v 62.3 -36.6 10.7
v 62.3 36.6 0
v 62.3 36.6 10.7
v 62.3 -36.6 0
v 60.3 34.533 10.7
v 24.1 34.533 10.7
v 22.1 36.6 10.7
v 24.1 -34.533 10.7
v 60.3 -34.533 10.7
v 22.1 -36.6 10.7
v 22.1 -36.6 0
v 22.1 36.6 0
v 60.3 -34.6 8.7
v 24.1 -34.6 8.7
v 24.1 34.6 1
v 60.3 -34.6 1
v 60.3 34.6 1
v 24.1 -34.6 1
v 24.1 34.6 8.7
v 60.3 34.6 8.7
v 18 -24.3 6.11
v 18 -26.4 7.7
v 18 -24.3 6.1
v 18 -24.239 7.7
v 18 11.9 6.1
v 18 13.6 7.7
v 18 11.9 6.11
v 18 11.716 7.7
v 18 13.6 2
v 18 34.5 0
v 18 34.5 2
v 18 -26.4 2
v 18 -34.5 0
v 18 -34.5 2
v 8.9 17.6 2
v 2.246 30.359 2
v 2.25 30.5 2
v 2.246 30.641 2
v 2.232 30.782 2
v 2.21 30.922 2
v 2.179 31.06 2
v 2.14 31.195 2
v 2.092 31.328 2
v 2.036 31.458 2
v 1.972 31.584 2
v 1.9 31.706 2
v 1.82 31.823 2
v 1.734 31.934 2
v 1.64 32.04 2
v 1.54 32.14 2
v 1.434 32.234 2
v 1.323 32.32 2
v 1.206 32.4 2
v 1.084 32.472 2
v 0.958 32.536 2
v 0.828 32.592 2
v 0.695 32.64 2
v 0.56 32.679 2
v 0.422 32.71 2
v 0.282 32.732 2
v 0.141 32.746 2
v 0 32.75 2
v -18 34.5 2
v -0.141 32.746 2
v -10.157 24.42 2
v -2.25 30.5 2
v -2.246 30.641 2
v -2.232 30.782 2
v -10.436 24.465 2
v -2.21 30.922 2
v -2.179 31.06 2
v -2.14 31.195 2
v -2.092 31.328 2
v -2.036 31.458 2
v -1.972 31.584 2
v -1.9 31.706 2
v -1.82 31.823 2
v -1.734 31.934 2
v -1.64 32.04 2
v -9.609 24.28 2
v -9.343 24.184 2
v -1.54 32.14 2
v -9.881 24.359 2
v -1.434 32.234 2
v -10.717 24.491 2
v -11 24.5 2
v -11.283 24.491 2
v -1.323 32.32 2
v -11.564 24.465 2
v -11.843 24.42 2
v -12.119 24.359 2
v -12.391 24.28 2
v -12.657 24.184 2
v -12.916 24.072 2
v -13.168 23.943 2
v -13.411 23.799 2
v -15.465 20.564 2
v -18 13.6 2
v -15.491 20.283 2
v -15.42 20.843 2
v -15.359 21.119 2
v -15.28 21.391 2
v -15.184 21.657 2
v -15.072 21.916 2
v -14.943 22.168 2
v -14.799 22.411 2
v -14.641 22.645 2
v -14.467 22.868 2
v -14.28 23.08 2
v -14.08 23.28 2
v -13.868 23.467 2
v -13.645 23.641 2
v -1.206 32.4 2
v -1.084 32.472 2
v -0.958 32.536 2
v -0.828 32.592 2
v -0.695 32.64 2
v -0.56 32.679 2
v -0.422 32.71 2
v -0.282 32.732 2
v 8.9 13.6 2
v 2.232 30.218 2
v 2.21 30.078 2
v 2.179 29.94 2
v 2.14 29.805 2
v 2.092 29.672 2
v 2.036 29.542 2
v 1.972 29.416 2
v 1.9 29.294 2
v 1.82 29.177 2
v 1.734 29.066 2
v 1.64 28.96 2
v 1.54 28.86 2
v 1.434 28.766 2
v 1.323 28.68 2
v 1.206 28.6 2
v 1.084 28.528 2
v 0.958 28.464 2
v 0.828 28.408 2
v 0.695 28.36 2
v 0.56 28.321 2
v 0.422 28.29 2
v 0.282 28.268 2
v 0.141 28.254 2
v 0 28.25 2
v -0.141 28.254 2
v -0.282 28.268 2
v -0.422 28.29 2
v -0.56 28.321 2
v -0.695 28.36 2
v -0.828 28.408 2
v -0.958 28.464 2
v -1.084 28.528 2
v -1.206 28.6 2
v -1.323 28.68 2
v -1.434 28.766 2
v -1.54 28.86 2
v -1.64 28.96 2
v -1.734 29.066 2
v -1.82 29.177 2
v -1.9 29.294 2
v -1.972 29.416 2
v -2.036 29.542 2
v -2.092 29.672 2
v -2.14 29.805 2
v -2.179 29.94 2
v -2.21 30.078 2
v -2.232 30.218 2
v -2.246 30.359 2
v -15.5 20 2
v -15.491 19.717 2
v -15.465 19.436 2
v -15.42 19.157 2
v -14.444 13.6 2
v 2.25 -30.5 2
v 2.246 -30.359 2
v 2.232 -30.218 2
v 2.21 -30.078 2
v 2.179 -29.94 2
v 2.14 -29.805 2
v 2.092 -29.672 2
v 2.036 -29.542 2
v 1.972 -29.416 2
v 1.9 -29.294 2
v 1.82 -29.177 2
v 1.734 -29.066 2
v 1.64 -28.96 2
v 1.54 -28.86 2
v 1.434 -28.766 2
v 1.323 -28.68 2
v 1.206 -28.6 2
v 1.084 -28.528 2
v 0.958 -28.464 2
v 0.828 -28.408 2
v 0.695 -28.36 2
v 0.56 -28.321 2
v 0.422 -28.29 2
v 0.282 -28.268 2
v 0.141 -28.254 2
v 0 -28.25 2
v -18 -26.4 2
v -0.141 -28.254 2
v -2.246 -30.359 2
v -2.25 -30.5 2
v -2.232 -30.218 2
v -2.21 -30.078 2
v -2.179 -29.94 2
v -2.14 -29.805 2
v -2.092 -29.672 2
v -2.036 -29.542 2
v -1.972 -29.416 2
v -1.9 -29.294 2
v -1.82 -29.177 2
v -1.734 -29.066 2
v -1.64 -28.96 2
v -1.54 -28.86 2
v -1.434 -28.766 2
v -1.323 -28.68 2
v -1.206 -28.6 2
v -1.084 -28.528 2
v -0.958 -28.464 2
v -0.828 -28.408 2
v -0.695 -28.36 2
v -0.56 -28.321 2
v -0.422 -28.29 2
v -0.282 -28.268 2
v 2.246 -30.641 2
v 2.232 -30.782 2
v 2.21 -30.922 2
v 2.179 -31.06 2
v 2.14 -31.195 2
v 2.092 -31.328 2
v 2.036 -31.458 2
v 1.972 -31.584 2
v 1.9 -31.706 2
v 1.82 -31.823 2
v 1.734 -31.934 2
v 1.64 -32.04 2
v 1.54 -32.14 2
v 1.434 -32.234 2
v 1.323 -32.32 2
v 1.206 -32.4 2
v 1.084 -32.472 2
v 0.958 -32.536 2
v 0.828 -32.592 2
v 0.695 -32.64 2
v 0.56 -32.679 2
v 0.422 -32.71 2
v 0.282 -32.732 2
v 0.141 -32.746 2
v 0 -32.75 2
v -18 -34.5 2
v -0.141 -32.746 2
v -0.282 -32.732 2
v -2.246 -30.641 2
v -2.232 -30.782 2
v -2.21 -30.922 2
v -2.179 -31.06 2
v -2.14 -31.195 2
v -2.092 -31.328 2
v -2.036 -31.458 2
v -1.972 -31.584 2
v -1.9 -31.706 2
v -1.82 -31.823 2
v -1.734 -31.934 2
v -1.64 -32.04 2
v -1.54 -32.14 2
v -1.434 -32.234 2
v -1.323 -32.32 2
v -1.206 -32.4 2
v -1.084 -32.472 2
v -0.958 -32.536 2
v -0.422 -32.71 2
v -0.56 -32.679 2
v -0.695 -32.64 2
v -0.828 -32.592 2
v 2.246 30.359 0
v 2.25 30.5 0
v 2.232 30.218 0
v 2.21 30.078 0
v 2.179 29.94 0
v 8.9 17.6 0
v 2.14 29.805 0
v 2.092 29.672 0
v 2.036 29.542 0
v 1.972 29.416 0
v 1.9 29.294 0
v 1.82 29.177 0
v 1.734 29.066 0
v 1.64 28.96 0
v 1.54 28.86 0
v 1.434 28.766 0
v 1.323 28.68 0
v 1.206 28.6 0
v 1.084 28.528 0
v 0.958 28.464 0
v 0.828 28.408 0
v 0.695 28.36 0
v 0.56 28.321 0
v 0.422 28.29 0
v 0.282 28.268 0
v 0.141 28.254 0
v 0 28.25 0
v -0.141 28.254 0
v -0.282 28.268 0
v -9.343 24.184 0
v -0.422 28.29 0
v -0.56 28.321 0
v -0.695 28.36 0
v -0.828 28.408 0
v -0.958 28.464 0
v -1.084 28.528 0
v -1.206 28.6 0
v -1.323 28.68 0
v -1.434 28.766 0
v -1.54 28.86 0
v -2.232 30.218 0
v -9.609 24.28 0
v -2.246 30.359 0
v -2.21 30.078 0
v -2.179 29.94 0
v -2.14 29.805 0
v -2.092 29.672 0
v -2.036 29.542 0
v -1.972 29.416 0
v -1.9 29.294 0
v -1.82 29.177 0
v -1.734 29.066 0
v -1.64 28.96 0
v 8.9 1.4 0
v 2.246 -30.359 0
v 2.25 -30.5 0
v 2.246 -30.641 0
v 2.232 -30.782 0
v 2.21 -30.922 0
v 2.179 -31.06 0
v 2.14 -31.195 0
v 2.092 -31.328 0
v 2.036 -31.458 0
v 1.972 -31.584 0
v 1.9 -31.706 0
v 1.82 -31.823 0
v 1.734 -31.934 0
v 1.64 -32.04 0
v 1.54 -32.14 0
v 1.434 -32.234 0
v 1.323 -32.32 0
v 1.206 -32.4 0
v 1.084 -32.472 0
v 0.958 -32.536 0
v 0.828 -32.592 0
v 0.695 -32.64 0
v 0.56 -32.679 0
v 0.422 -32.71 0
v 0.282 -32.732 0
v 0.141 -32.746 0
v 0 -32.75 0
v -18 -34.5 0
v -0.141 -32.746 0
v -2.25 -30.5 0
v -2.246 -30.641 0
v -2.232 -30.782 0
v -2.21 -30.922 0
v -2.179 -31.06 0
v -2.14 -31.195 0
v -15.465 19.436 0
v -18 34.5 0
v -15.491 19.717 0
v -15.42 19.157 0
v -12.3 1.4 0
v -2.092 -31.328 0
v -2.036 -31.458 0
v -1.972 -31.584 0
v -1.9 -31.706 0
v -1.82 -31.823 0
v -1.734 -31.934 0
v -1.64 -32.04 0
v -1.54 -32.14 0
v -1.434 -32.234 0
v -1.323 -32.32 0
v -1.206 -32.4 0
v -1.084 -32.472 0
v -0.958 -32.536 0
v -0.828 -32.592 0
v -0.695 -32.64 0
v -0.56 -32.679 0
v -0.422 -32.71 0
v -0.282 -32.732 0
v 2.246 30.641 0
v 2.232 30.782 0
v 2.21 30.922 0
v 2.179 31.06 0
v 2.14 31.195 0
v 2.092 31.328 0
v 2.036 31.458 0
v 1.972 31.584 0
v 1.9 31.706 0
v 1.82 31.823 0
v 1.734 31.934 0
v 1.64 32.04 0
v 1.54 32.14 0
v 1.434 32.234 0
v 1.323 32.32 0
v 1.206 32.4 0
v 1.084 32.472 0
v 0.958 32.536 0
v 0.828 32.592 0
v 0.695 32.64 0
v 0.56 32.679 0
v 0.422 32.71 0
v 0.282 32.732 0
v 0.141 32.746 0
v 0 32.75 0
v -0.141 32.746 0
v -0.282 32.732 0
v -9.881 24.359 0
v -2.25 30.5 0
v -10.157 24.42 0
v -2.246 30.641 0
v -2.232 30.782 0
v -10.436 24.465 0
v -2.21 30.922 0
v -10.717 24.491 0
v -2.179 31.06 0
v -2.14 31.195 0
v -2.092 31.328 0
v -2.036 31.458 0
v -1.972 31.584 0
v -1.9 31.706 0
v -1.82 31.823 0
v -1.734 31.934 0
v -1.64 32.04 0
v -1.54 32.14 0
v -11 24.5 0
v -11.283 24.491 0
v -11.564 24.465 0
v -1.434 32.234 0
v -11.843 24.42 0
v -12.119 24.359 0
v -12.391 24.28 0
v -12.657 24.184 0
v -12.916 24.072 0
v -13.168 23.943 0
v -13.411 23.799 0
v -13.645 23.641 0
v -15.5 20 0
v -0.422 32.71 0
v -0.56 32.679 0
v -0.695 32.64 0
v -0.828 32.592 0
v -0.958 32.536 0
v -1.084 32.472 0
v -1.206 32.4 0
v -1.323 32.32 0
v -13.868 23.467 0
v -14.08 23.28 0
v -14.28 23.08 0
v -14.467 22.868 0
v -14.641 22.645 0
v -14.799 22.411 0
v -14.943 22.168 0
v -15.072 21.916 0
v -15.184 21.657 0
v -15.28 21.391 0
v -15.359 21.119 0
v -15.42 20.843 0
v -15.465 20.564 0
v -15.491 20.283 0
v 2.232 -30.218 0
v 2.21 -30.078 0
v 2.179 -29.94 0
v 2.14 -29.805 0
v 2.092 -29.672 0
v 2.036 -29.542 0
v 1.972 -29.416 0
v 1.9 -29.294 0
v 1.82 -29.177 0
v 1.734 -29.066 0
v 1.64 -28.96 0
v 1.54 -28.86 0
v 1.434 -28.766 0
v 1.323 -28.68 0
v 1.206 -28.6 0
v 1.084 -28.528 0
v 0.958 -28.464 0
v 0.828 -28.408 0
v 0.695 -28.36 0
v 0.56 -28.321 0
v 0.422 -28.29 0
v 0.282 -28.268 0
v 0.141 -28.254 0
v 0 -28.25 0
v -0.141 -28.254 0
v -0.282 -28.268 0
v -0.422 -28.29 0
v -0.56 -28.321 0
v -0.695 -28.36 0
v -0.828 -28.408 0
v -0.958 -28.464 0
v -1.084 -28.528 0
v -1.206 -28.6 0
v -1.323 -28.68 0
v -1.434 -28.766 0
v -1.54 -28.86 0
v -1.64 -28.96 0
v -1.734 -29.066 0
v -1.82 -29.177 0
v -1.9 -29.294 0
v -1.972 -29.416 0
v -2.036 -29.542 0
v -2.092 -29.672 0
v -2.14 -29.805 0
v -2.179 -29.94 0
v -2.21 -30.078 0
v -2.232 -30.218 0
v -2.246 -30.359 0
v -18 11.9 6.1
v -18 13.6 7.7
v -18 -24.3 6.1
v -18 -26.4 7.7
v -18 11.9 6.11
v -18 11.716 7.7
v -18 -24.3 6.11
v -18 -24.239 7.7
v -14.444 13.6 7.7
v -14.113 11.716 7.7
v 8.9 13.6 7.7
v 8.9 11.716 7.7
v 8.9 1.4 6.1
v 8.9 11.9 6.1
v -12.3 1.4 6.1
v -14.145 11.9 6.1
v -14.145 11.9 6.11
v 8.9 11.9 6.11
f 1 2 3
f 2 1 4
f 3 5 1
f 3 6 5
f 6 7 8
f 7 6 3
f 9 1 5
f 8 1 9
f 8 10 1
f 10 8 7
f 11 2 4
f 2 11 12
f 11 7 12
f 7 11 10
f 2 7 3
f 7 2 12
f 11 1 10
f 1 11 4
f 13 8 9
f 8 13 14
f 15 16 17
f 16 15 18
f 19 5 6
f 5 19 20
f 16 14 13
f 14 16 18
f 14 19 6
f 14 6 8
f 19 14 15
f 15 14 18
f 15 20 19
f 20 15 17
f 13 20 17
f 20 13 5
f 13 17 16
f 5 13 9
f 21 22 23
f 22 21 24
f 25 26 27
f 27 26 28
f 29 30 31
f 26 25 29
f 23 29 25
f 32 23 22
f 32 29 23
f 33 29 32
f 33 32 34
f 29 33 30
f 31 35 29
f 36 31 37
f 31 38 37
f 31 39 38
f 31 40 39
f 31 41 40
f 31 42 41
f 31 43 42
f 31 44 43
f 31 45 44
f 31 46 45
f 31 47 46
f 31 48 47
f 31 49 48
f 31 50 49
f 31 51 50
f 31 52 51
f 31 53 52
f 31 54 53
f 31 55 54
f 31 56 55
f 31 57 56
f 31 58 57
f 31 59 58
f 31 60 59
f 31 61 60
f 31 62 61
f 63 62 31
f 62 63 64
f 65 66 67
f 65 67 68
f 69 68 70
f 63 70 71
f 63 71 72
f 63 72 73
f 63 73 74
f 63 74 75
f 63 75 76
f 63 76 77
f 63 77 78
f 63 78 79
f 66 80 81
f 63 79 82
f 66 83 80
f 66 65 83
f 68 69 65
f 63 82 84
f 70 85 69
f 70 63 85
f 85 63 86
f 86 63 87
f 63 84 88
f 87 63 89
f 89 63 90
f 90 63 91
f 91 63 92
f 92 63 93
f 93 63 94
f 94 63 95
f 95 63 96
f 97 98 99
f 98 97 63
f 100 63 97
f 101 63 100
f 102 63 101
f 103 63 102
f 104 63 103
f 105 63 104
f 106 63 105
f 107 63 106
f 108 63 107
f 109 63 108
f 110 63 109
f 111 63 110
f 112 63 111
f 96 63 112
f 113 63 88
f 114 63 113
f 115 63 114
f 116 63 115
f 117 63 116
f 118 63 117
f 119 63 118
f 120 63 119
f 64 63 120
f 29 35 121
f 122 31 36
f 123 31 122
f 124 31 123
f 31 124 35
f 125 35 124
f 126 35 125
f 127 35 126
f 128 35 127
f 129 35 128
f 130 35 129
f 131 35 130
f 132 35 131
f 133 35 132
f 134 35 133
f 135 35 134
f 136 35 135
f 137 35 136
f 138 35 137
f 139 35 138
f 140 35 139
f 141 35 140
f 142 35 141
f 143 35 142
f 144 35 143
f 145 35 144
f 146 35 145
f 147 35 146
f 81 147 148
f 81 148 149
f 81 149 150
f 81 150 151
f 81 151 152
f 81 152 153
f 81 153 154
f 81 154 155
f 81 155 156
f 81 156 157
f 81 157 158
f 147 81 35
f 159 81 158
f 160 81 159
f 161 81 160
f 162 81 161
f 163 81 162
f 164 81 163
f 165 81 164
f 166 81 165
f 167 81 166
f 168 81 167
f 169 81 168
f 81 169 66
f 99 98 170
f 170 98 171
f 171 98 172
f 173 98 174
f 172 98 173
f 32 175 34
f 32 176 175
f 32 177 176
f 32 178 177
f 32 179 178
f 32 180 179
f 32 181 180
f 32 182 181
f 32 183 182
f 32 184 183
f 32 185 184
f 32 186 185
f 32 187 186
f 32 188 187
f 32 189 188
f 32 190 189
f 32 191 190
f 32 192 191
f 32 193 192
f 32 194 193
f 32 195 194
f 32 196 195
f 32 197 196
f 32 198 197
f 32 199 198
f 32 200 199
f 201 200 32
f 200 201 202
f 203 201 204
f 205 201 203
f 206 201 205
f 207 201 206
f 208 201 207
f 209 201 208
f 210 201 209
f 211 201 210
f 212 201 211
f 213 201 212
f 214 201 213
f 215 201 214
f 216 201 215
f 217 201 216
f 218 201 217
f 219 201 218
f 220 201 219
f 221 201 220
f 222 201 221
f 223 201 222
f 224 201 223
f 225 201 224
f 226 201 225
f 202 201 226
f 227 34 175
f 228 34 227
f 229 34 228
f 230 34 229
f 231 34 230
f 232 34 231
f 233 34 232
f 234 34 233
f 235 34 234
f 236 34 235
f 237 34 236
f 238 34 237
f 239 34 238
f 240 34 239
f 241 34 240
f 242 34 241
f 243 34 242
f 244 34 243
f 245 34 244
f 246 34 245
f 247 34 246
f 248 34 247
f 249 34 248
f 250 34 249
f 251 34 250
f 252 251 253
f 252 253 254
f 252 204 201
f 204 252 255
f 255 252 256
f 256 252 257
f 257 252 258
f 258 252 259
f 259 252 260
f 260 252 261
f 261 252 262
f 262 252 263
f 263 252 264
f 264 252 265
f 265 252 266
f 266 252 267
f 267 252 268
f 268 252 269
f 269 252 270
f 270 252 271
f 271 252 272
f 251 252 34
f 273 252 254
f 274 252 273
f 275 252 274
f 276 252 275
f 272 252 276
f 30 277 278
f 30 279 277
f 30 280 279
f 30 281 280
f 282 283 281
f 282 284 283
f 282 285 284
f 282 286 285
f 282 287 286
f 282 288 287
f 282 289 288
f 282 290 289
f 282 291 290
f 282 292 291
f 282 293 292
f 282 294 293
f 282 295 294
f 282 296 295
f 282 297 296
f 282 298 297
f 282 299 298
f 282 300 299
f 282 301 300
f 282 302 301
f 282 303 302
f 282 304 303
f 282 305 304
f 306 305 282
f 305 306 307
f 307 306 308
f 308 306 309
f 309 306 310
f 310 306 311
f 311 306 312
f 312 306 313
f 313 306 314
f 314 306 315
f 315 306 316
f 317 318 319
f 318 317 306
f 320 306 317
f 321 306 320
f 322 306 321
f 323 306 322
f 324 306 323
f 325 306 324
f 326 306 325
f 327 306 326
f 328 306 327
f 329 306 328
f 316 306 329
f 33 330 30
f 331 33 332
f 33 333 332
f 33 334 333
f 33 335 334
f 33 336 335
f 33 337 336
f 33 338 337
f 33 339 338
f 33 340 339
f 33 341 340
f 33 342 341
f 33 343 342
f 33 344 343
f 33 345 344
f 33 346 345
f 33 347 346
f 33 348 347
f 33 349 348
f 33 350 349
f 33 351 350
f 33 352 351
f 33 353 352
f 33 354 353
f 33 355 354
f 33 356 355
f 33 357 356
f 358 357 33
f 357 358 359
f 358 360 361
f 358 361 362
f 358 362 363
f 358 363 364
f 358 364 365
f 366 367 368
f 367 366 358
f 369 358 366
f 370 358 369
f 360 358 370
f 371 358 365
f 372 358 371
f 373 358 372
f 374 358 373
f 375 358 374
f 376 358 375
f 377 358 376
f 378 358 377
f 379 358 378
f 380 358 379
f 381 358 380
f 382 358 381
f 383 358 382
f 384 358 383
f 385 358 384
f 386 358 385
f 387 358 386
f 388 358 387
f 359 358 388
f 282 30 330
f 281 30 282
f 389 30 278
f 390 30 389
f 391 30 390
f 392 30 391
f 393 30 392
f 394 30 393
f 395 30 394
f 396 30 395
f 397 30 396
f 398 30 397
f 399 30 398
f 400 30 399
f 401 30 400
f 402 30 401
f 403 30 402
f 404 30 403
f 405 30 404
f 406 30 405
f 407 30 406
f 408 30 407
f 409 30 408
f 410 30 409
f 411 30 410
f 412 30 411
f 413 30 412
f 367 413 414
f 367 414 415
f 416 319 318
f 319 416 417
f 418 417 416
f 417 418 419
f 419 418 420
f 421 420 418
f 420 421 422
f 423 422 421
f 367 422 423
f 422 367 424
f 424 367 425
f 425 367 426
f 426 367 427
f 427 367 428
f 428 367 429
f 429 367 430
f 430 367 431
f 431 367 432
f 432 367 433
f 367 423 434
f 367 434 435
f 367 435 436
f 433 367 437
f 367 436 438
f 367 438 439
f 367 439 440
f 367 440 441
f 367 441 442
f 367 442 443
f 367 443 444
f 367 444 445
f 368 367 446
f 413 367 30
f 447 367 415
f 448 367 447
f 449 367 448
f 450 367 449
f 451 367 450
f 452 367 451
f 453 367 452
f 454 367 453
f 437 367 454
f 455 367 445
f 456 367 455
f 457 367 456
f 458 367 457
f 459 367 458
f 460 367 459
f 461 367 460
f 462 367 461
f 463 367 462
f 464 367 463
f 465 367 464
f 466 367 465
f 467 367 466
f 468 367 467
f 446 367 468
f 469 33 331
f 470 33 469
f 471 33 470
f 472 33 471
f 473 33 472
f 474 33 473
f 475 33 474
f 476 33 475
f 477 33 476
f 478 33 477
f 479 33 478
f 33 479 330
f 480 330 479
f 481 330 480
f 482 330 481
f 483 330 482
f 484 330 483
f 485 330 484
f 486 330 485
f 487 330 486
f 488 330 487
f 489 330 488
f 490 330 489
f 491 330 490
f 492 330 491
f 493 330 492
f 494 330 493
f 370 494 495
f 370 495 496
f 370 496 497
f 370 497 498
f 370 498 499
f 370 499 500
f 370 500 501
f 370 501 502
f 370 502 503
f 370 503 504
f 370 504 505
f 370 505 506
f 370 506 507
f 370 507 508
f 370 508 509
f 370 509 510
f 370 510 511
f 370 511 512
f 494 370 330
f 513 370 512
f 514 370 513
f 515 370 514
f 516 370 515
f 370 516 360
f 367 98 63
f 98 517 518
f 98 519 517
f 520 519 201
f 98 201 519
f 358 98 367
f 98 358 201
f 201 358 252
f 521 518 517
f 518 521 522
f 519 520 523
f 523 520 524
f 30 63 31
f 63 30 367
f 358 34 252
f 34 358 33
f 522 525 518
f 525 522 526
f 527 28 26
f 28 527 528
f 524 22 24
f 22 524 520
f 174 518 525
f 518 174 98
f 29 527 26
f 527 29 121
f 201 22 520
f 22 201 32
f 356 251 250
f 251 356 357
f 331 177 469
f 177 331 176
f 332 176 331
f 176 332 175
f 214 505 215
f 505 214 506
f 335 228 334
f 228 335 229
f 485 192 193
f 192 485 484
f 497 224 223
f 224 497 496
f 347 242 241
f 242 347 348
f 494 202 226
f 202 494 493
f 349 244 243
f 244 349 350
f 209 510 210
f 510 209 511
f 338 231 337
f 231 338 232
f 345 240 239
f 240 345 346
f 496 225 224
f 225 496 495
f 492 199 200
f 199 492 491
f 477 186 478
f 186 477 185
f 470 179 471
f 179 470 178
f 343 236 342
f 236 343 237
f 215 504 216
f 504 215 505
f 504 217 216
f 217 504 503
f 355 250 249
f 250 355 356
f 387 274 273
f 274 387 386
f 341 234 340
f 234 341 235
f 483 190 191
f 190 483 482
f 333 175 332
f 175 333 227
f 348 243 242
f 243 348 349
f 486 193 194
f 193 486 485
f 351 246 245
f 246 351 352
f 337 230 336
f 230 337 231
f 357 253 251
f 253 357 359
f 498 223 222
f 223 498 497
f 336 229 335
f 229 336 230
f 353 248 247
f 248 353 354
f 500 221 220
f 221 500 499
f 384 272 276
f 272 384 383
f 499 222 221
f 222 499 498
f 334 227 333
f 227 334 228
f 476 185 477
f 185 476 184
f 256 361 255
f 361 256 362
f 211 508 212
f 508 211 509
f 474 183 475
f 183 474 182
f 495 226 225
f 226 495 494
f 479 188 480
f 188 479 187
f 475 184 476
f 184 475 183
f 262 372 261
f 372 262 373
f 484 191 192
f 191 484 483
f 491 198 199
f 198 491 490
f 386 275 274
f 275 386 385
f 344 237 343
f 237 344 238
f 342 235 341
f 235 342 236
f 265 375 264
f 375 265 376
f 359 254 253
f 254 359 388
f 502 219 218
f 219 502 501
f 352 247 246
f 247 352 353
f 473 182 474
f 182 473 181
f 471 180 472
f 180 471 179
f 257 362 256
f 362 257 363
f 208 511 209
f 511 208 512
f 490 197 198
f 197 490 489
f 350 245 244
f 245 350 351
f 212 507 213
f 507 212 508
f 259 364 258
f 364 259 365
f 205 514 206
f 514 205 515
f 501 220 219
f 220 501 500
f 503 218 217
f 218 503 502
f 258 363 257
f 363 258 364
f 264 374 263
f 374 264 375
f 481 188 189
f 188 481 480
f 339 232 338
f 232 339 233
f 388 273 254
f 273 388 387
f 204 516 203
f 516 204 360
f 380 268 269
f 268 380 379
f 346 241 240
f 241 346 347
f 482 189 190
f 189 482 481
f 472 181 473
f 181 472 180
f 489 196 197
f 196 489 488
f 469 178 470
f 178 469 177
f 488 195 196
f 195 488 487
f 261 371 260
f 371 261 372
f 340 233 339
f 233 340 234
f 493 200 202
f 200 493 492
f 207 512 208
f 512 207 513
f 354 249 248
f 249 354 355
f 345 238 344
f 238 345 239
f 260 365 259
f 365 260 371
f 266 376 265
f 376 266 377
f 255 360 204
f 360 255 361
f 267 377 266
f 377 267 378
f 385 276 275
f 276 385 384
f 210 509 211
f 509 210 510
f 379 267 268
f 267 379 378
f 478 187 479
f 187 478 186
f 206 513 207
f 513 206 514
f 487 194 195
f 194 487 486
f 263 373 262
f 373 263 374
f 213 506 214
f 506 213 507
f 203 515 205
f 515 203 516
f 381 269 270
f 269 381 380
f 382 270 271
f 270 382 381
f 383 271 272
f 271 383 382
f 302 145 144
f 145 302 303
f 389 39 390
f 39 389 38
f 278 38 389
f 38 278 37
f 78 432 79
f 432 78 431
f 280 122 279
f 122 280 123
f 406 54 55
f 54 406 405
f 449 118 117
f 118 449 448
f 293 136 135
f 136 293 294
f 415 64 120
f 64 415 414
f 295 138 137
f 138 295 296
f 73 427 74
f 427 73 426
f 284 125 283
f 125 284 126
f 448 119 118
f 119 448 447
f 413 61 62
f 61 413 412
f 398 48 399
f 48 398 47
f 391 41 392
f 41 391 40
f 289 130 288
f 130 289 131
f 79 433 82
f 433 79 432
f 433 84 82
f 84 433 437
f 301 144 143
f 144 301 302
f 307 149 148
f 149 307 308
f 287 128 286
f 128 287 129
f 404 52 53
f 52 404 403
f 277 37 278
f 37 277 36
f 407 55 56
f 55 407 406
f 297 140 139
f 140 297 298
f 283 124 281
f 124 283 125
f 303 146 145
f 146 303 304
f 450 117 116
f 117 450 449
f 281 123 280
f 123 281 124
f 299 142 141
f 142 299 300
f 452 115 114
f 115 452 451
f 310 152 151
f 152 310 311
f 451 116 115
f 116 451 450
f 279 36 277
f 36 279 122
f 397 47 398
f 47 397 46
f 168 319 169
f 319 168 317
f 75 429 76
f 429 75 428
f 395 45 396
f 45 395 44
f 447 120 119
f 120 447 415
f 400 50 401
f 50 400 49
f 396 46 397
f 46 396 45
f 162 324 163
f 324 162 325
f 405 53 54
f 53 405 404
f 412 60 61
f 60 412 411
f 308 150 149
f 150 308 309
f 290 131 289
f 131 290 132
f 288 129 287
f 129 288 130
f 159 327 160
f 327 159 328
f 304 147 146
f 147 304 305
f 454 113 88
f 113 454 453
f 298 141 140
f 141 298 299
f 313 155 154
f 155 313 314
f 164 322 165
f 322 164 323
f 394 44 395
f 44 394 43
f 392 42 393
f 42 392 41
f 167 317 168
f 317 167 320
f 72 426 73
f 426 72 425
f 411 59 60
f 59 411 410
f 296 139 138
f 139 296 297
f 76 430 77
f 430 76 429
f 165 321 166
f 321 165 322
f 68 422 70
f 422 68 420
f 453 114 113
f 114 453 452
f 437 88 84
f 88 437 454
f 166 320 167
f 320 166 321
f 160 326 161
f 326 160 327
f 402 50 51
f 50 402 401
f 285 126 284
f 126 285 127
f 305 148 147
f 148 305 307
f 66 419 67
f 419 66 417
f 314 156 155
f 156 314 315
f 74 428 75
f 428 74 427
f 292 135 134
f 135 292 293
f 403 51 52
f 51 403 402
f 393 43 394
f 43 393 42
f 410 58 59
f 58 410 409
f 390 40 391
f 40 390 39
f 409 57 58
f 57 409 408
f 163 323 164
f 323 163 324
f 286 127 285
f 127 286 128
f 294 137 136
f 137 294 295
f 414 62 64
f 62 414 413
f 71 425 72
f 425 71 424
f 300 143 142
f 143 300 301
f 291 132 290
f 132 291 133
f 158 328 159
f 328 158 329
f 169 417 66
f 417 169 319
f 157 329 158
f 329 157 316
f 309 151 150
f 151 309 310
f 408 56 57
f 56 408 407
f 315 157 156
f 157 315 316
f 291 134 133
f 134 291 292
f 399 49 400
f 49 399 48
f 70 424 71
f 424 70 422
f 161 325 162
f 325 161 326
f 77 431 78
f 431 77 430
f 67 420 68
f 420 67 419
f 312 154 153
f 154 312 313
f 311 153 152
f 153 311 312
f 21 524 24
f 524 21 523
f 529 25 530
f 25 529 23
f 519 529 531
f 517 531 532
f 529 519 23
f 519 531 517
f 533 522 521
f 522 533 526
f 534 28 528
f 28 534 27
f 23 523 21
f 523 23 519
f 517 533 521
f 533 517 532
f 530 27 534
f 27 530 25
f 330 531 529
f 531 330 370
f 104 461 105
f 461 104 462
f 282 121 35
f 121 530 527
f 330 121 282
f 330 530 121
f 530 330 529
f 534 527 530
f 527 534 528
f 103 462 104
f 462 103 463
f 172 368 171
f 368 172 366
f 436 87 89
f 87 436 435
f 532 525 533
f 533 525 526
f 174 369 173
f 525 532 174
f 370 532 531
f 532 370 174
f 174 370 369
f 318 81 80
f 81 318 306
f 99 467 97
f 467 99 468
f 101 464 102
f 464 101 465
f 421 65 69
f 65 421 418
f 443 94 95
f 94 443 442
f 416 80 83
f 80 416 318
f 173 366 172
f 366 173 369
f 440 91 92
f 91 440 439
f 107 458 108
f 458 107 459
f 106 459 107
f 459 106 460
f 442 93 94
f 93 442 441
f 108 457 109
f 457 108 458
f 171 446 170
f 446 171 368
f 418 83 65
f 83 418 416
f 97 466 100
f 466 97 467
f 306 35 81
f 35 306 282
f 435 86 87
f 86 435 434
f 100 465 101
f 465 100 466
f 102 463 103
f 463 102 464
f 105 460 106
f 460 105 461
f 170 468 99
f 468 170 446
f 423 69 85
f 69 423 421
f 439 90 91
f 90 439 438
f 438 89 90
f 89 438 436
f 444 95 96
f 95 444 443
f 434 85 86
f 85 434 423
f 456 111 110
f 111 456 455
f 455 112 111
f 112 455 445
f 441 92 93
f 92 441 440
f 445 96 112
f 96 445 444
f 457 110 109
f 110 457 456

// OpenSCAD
// Case for NFC reader
// Reader type: MFRC522 by RobotDyn will supplied 9 way header
// Connector type: Molex 8 way

// Tolerances for your printer
t=0.1;  // General xy tolerance/margin
z=0.2;  // General z tolerance/margin
clip=0.1;  // Clip size

// Thickness of walls
sidet=2;
frontt=1;
backt=2;

// Fixings to match Max Reader
screwd=4.5; // Diameter (screw hols top/bottom)
screwv=61; // Spacing
screwhd=8; // Screw head diameter
screwht=3; // Screw head thickness
egressx=-11; // Engress hole position relative to cenrte
egressy=20;
egressd=9; // Diameter

// PCB size
pcbw=36; // width
pcbh=36; // height
pcbt=1.6; // thickness of pcb
pcbf=2; // space on front for components
pcbb=2; // space on back for components
pcbm=5; // border margin with no components

// PCB fixings?
//fixd=4; // Holes on PCB - need to allow in pcbf;
//fixh=31;
//fixv=31;

// Connector
connw=21;
connh=16;
connt=6;
connx=5.8; // position from edge of board
conny=25.8;

// Box size
boxw=sidet*2+t*2+pcbw;
boxh=screwv+screwhd+t*2+sidet*2;
boxt=frontt+t+pcbf+pcbt+connt;

pcby=sidet+t-boxh/2+screwhd+t*2+sidet;

$fn=100;

module lid()
{
    difference()
    {
        translate([-boxw/2,-boxh/2,0])
        cube([boxw,boxh,boxt]);
        hull()
        {
            translate([sidet-boxw/2,sidet-boxh/2,frontt])
            cube([boxw-sidet*2,boxh-sidet*2,boxt-frontt-backt]);
            translate([sidet-boxw/2,sidet+clip-boxh/2,boxt])
            cube([boxw-sidet*2,boxh-sidet*2-clip*2,1]);
        }
    }
}

module base()
{
    difference()
    {
        union()
        {
            translate([sidet+t-boxw/2,sidet+t-boxh/2,0])
            cube([boxw-sidet*2-t*2,boxh-sidet*2-t*2,backt]);
            translate([-pcbw/2,pcby-sidet-t,0])
            cube([pcbw,pcbh+sidet*2,connt+t+pcbt]);
        }
        // Board
        hull()
        {
            translate([-t*2-pcbw/2,pcby,connt+t])
            cube([pcbw+t*4,pcbh+t*2,0.01]);
            translate([-t*2-pcbw/2,pcby+clip,connt+t+pcbt])
            cube([pcbw+t*4,pcbh-clip*2,1]);
        }
        // Screws
        for(y=[-screwv/2,screwv/2])
        translate([0,y,-1])
        {
            cylinder(d=screwd,h=boxt);
            translate([0,0,1.01+backt])
            cylinder(d=screwhd,h=boxt);
        }
        // Egress + connector
        hull()
        {
            translate([egressx,egressy,-1])
            cylinder(d=egressd,boxt);
            translate([connx-pcbw/2-t,pcby+conny-t,-1])
            cube([connw+t*2,connh+t*2,boxt]);
        }
    }
}

translate([boxw+sidet,0,0])lid();
base();
